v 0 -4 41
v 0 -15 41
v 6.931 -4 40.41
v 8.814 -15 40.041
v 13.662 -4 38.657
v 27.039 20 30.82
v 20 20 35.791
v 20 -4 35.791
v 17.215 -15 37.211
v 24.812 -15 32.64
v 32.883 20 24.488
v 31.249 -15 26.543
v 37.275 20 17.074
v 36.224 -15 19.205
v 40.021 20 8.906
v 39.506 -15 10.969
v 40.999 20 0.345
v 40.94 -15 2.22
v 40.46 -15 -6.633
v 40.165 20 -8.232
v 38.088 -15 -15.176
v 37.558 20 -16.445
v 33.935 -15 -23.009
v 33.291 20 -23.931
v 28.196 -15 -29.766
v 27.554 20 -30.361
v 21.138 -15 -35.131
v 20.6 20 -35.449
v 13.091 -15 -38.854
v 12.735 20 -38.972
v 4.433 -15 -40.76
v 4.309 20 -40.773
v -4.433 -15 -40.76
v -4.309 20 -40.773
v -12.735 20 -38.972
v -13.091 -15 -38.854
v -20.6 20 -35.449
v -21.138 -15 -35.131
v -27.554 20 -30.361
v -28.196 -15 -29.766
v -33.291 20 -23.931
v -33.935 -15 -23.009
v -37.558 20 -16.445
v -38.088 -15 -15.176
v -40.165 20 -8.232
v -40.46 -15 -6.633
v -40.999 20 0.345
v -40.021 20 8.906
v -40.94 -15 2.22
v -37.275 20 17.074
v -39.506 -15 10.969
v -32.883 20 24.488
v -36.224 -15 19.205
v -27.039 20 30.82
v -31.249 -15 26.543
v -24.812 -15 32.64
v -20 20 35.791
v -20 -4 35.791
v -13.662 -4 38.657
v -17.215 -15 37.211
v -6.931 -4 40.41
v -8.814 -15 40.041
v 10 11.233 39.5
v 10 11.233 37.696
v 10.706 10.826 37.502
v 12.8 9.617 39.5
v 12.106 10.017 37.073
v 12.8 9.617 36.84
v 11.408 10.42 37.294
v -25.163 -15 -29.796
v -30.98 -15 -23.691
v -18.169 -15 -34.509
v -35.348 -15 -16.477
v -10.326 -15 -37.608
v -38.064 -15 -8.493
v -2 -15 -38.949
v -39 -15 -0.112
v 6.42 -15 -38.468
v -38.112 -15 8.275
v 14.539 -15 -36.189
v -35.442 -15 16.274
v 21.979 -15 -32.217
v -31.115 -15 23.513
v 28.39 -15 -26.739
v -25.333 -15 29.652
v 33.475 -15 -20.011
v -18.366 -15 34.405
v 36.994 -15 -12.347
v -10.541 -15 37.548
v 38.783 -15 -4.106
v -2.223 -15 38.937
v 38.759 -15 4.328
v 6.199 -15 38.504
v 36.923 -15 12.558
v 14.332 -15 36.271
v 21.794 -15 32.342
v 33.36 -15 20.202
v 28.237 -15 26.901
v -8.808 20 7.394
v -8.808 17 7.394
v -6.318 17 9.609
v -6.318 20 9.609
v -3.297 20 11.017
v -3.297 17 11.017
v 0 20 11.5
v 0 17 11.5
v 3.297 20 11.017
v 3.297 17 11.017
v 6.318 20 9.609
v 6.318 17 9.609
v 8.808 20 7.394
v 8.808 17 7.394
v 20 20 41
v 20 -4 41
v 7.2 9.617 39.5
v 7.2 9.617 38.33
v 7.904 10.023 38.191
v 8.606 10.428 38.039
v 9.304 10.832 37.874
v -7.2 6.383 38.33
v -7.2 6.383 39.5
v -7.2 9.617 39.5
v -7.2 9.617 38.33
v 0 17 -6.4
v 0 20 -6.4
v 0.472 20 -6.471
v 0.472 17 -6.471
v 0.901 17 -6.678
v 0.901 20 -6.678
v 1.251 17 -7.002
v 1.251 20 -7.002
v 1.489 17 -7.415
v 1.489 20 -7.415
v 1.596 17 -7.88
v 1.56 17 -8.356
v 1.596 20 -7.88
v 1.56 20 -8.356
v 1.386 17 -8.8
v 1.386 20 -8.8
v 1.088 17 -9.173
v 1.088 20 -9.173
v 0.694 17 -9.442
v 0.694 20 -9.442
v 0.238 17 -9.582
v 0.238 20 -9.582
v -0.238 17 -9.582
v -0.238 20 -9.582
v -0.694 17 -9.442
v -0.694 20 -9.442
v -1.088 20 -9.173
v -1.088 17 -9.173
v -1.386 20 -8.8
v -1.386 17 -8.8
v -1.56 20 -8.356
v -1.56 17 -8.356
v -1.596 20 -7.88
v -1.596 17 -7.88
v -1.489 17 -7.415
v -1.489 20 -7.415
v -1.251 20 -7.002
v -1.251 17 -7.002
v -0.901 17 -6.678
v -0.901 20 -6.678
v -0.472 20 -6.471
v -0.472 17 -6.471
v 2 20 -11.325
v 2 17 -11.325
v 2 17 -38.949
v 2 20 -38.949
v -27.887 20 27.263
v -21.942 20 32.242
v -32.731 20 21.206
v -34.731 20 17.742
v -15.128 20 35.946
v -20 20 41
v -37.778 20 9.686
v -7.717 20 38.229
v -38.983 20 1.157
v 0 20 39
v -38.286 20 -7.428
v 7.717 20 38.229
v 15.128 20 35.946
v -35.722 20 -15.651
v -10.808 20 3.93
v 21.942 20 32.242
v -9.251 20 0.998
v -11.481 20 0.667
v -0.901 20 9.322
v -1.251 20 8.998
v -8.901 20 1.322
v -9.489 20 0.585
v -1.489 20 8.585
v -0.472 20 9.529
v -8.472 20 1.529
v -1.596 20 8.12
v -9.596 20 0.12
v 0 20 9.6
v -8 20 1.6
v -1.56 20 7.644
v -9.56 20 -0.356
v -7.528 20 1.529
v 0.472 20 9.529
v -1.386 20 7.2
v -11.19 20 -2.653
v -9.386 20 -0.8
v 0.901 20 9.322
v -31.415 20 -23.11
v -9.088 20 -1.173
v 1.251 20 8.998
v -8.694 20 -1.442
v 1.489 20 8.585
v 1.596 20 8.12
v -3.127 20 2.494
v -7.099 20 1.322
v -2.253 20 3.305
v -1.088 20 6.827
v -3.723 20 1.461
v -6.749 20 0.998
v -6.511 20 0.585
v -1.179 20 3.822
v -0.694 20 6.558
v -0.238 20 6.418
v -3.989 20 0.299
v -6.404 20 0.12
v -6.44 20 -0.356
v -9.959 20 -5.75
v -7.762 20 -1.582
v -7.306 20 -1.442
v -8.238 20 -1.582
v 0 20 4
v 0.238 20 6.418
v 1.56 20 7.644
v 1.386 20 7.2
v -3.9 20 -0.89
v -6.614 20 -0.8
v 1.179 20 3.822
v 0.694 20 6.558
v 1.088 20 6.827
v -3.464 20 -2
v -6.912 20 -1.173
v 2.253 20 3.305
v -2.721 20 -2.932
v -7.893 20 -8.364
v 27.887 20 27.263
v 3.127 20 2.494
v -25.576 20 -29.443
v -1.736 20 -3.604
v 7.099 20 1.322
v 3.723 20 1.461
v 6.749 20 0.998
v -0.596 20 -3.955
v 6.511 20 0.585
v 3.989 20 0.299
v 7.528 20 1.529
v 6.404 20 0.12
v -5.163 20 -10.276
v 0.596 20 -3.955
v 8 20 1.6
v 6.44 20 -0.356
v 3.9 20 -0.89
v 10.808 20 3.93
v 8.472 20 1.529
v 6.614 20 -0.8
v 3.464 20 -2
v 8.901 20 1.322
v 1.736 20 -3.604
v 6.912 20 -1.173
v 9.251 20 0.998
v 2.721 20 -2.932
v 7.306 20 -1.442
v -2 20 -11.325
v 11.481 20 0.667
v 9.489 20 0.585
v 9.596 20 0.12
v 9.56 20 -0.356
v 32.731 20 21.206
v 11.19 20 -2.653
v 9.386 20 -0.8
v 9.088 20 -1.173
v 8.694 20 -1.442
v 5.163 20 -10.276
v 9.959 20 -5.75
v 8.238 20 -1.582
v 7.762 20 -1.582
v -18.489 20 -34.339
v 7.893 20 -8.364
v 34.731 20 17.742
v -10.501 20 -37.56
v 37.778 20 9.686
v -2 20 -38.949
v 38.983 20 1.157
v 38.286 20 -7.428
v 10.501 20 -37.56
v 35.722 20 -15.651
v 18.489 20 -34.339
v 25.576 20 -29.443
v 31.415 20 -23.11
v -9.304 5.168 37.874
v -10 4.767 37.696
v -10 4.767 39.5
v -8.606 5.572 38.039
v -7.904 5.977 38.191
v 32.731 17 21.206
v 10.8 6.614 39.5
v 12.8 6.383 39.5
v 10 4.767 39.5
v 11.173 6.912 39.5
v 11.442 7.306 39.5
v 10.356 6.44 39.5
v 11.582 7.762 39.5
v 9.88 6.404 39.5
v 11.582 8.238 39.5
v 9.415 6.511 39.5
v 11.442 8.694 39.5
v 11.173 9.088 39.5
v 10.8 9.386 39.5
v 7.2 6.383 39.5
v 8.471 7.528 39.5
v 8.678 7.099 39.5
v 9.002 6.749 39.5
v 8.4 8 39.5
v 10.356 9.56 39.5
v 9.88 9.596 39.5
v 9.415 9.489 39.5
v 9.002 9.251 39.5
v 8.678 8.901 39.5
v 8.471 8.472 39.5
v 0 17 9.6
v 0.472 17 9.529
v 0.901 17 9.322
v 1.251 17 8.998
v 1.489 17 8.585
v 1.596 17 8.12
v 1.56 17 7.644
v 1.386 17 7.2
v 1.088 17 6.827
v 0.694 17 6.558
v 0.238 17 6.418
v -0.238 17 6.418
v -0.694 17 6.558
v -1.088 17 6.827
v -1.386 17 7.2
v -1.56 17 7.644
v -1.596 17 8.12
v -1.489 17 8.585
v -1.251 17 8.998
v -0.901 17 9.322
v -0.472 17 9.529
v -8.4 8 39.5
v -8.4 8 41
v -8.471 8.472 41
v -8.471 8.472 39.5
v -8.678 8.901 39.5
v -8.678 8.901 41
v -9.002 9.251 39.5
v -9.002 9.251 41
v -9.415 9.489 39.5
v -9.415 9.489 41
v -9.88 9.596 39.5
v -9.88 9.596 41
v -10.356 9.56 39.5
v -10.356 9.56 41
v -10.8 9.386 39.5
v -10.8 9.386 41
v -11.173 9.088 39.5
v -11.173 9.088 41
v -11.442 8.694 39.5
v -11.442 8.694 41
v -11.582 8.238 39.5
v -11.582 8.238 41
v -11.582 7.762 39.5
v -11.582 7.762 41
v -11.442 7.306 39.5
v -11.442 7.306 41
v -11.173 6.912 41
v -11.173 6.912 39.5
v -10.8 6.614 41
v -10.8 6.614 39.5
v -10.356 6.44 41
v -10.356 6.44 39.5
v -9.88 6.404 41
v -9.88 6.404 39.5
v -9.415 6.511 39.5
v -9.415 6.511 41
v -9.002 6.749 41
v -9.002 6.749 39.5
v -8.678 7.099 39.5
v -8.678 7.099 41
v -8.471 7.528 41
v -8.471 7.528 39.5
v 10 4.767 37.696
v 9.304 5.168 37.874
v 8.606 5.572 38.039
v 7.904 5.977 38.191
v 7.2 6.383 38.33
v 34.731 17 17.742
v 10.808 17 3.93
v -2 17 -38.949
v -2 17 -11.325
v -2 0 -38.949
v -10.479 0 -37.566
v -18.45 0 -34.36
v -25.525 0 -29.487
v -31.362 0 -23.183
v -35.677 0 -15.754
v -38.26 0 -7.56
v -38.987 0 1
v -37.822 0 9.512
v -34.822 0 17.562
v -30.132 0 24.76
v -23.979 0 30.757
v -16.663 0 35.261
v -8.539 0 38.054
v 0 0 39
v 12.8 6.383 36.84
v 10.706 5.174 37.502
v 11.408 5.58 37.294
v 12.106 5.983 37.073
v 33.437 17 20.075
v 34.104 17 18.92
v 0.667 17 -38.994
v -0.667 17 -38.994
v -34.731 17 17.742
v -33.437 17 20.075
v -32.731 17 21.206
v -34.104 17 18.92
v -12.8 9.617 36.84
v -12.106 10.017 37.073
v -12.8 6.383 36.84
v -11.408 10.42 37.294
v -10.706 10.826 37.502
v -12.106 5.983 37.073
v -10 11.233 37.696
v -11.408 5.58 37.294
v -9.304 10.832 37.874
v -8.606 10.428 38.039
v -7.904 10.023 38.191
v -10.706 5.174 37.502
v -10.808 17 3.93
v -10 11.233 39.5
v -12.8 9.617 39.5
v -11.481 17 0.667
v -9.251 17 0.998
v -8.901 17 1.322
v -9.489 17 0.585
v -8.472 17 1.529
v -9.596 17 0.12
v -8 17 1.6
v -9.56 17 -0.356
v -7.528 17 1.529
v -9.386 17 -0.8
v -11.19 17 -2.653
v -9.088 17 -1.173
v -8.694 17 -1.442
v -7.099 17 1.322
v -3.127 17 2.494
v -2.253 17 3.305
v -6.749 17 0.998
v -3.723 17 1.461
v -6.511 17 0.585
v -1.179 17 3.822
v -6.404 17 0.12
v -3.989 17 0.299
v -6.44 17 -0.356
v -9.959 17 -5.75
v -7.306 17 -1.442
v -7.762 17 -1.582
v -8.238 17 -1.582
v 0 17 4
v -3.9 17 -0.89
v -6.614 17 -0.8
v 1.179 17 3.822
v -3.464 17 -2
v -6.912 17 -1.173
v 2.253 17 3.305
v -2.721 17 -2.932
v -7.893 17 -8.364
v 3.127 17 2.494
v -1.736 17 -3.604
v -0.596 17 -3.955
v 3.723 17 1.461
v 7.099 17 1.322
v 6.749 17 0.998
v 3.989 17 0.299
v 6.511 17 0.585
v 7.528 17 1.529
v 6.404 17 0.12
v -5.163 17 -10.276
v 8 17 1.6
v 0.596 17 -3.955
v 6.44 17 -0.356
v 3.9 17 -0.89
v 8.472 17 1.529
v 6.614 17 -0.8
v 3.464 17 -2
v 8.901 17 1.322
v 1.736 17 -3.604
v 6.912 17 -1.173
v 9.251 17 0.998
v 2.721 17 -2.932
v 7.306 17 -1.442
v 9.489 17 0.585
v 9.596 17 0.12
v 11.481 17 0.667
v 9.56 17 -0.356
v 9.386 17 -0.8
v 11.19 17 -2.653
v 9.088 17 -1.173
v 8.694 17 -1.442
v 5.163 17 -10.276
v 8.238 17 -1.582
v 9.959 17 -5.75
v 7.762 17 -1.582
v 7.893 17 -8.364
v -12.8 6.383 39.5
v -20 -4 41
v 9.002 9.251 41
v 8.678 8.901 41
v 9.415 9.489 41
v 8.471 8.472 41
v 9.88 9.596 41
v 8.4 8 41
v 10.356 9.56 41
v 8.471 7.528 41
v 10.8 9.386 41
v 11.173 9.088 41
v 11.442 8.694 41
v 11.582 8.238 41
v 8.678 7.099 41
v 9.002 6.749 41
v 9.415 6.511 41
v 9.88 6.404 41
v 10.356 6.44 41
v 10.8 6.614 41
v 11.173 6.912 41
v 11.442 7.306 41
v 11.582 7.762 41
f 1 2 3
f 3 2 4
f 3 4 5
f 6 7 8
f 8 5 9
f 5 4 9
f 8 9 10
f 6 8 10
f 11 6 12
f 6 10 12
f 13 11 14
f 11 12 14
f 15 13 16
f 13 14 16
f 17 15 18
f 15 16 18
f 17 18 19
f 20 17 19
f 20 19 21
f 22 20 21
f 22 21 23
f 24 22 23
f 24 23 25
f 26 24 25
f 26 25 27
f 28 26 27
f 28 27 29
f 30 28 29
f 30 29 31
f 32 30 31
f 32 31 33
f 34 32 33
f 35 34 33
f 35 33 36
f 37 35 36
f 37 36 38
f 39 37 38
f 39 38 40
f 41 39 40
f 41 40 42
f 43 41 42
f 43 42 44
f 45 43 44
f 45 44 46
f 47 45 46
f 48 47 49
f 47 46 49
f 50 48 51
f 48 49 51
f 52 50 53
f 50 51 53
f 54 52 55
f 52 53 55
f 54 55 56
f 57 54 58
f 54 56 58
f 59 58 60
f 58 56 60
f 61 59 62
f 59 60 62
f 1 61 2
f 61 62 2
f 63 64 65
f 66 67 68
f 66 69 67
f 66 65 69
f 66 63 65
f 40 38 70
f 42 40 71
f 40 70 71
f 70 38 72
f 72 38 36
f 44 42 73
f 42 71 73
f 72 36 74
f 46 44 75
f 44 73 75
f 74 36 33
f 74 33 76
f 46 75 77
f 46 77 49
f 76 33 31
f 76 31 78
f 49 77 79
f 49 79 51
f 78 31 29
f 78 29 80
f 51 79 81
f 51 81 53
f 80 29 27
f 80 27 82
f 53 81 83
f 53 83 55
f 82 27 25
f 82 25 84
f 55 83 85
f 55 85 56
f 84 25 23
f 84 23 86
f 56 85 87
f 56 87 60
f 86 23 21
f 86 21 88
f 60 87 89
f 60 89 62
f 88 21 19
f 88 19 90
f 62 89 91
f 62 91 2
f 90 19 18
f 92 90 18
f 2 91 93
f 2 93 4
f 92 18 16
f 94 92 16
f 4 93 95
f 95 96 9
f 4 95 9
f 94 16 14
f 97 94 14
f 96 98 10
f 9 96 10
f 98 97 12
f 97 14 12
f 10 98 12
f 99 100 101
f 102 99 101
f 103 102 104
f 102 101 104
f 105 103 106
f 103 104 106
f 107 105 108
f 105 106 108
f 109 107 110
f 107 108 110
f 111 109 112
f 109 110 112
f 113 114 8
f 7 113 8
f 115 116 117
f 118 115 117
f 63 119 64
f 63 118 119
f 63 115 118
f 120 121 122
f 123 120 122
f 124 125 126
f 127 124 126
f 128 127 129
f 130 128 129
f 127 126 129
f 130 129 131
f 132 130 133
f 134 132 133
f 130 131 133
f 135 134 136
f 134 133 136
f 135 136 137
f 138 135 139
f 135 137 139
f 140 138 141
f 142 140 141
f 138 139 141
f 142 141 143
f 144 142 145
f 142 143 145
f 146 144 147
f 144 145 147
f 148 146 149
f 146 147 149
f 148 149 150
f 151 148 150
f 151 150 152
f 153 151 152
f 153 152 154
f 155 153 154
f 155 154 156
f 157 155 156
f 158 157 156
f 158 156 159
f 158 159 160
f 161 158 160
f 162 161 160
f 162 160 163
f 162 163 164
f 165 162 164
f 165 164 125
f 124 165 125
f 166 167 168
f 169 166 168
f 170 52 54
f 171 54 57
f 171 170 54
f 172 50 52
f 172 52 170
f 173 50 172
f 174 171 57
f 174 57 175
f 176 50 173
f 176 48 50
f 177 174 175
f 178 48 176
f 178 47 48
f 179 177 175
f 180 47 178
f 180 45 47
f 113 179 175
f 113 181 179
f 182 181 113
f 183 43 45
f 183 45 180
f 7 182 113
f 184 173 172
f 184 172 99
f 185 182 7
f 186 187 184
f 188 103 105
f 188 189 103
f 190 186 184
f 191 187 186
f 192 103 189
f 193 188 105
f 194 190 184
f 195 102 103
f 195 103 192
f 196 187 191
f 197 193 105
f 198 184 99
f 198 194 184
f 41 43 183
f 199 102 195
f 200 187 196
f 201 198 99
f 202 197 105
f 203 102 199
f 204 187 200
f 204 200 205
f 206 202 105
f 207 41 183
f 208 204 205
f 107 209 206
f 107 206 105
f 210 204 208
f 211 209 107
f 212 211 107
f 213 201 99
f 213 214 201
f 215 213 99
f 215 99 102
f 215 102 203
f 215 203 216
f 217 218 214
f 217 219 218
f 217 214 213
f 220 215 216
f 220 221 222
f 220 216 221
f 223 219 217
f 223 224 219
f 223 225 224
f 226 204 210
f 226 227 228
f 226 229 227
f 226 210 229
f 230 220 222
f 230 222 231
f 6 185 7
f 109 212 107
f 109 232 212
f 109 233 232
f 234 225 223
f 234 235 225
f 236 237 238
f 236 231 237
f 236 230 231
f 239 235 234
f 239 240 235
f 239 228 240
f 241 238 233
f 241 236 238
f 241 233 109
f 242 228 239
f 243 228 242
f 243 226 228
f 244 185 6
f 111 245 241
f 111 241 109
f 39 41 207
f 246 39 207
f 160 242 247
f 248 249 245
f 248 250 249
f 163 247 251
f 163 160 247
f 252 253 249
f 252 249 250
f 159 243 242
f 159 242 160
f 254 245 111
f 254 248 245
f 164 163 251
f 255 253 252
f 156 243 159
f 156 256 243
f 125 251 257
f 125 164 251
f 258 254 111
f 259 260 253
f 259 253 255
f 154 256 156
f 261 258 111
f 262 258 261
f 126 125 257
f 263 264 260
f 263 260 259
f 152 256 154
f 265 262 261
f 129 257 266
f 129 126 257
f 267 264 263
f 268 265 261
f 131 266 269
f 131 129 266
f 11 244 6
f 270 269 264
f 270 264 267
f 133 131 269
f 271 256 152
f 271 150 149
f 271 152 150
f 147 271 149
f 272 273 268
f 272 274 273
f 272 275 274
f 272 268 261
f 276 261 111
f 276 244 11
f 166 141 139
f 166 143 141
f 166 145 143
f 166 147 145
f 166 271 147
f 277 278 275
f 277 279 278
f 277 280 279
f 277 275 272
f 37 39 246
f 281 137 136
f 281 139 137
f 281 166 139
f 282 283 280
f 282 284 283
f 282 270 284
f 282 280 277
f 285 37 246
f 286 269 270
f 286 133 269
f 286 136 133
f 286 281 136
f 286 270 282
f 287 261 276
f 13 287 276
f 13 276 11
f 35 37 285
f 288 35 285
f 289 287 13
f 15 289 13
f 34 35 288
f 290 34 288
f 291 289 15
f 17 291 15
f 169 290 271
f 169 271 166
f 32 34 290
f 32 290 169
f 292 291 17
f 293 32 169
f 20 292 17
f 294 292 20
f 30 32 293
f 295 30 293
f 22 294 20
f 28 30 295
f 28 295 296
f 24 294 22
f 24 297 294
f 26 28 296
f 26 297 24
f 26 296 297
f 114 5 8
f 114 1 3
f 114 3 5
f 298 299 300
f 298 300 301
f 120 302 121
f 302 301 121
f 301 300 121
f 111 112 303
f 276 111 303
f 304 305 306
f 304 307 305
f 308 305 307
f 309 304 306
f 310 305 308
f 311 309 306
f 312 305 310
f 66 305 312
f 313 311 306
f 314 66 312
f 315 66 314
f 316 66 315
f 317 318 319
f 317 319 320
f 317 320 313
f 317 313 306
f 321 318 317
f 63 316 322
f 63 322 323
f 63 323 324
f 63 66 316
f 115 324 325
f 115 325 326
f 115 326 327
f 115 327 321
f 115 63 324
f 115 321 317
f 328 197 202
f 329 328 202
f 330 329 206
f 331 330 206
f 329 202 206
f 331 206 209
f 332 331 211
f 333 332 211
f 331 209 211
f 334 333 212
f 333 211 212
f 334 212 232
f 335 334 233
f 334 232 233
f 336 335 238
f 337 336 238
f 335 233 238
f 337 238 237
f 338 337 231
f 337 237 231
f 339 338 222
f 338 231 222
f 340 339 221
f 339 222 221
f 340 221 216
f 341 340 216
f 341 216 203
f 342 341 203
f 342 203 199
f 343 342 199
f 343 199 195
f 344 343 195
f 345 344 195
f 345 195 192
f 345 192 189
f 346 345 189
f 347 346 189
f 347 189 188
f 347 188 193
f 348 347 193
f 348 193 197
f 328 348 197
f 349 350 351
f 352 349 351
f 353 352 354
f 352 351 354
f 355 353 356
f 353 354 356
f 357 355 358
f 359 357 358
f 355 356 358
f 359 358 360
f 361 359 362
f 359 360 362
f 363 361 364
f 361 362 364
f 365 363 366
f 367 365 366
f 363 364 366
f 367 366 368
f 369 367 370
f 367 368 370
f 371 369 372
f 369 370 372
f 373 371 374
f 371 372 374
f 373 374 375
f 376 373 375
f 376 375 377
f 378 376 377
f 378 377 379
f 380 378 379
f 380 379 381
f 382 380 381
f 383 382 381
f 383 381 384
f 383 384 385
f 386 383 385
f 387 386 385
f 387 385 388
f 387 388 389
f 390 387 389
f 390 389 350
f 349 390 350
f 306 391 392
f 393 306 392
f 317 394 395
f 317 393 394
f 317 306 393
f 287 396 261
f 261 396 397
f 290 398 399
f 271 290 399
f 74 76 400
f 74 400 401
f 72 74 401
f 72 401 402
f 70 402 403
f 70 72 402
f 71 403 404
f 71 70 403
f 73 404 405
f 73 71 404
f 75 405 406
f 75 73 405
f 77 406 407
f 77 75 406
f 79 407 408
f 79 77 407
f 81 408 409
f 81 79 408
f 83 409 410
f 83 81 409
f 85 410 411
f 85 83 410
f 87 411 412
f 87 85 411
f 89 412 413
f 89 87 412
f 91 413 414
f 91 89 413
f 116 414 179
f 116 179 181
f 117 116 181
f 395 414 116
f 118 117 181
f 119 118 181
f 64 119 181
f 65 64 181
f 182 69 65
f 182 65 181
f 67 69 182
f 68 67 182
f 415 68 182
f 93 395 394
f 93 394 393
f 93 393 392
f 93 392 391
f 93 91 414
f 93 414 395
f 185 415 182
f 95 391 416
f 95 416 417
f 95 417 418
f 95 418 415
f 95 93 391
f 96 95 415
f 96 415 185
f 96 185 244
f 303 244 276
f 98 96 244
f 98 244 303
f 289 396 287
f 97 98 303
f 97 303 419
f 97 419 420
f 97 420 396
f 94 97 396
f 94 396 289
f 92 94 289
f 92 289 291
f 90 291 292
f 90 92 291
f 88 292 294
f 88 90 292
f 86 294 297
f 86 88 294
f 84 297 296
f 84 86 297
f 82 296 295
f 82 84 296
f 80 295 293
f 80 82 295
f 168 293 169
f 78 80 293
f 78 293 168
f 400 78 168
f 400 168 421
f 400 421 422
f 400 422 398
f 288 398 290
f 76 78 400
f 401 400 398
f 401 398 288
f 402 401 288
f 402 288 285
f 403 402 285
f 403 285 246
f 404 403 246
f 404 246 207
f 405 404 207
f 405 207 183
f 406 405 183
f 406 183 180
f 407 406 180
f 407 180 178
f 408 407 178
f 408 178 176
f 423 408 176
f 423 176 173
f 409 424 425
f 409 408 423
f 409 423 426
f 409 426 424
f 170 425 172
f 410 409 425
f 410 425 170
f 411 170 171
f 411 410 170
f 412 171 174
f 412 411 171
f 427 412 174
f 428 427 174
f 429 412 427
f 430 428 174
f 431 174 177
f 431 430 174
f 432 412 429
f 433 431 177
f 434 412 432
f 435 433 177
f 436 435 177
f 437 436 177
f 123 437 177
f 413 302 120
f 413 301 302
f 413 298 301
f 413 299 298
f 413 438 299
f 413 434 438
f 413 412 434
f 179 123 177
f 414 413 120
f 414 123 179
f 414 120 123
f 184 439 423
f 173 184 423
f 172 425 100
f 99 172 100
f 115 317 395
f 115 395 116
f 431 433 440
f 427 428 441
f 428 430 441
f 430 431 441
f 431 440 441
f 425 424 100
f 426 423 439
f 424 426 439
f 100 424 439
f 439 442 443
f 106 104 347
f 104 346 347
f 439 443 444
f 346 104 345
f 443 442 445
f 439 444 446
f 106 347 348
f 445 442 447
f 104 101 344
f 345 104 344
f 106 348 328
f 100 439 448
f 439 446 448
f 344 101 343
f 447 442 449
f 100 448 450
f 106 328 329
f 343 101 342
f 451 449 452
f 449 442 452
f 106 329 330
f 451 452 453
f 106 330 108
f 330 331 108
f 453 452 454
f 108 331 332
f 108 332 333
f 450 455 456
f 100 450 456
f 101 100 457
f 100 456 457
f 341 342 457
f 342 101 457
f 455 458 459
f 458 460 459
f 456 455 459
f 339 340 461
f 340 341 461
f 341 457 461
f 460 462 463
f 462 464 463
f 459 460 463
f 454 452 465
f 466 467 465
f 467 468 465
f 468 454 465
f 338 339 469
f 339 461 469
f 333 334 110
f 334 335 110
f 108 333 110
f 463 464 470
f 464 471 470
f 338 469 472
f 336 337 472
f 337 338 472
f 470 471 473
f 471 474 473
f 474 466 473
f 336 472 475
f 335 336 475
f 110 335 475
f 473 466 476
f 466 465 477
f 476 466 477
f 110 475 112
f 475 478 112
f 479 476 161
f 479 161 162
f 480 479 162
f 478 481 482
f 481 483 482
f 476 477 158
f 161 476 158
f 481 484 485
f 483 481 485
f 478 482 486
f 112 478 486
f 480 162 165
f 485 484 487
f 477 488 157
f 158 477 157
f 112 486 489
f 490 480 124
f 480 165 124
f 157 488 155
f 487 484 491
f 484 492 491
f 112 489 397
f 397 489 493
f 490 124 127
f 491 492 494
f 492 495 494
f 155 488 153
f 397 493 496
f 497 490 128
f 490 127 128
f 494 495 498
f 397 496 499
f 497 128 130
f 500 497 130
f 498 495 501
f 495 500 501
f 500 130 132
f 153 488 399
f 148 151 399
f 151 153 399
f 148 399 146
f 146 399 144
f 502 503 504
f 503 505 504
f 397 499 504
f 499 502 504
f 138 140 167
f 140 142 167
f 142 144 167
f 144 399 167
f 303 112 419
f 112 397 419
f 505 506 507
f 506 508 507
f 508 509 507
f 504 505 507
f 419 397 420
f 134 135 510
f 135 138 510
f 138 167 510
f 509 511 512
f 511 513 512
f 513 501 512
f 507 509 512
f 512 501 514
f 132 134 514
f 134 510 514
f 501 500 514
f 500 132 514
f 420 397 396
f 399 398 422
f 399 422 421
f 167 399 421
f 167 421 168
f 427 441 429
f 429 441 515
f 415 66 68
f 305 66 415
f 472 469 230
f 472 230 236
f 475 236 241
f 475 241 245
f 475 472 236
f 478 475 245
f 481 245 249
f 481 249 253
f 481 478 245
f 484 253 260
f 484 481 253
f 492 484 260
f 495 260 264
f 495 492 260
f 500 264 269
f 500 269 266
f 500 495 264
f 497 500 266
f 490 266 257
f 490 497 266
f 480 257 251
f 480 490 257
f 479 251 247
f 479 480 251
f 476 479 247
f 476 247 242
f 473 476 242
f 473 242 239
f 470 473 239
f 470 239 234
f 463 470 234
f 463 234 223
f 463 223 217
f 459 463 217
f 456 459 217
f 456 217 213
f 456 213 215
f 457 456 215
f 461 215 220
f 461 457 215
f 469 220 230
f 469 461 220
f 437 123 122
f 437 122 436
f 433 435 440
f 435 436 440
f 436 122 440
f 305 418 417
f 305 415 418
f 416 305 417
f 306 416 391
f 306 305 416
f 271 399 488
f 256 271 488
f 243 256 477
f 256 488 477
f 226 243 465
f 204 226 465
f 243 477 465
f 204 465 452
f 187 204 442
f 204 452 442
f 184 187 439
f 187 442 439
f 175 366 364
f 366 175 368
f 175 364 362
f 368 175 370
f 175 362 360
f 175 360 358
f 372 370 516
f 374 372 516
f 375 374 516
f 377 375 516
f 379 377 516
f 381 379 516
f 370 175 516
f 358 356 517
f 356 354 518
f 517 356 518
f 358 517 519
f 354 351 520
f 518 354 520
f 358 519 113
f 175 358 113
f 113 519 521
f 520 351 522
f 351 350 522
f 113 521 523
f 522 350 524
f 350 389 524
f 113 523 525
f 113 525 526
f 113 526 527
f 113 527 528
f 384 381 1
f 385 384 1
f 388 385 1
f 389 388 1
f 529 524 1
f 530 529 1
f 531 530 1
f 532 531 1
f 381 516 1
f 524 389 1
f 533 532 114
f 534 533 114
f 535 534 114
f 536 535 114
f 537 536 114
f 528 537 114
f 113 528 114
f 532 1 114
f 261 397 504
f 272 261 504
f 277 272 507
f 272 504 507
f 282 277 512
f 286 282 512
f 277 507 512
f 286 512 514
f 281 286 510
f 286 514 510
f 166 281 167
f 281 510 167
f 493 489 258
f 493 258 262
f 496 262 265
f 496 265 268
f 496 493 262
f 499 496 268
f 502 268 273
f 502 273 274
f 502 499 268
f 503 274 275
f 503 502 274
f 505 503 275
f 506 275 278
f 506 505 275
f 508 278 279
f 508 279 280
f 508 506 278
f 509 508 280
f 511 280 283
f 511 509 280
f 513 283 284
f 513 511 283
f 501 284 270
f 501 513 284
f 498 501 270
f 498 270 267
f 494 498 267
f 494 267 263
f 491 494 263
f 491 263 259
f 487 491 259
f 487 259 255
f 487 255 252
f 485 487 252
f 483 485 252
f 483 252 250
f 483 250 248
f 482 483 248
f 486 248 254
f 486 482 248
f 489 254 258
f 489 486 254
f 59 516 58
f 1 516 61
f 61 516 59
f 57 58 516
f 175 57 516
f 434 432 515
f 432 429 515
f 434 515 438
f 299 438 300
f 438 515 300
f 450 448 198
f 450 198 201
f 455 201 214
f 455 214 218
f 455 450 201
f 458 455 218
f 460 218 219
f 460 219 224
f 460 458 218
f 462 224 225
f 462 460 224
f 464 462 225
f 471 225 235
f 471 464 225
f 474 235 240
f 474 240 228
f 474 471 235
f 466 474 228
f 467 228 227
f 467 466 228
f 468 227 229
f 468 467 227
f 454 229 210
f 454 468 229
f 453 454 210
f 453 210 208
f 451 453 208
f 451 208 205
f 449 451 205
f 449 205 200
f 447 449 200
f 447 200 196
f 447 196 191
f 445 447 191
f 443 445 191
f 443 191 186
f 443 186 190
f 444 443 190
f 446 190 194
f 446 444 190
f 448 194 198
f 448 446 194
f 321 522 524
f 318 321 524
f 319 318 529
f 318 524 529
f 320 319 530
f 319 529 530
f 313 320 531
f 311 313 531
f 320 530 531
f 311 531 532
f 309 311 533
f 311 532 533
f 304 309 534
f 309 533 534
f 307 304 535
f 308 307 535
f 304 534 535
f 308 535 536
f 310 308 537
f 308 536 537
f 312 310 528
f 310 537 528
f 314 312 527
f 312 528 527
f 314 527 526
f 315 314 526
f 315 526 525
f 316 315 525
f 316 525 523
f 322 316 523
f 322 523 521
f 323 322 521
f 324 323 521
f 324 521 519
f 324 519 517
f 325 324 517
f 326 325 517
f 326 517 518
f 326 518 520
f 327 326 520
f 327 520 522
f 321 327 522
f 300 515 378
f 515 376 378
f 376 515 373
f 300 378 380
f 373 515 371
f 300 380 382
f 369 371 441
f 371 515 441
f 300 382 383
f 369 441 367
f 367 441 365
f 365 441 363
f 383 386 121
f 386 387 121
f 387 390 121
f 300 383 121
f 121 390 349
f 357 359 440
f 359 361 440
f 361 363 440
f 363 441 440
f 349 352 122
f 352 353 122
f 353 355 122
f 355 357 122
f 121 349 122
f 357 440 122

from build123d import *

# Parameters (mm, degrees)
SKETCH_1_R           = 41
SKETCH_1_R_2         = 39
EXTRUDE_1_DEPTH      = 20
EXTRUDE_START        = -14
EXTRUDE_2_DEPTH      = 14
EXTRUDE_START_2      = -3
SKETCH_3_R           = 4
SKETCH_3_R_2         = 1.6
EXTRUDE_3_DEPTH      = 3
CUT_EXTRUDE_3_DEPTH  = 3
EXTRUDE_5_DEPTH      = 10
EXTRUDE_5_DEPTH_BACK = 15
SKETCH_1_2_R         = 41
SKETCH_1_2_R_2       = 39
EXTRUDE_START_3      = 10
EXTRUDE_7_DEPTH      = 10
EXTRUDE_8_DEPTH      = 10
EXTRUDE_8_DEPTH_BACK = 5
CUT_EXTRUDE_4_DEPTH  = 10
EXTRUDE_9_DEPTH      = 10
EXTRUDE_9_DEPTH_BACK = 1.5
CUT_EXTRUDE_6_DEPTH  = 10
SKETCH_16_R          = 1.6
CUT_EXTRUDE_7_DEPTH  = 3
SKETCH_18_R          = 1.6
CUT_EXTRUDE_8_DEPTH  = 10
SKETCH_18_4_R        = 1.6
CUT_EXTRUDE_9_DEPTH  = 10


with BuildPart() as part:
    # 草图1 → 凸台-拉伸1 (new body)
    with BuildSketch(Plane(origin=(0, 0, 0), x_dir=(1, 0, 0), z_dir=(0, 1, 0))):
        Circle(SKETCH_1_R)
        Circle(SKETCH_1_R_2, mode=Mode.SUBTRACT)
    extrude(amount=EXTRUDE_1_DEPTH)

    # 草图2 → 凸台-拉伸2 (add)
    with BuildSketch(Plane(origin=(0, 20, 0), x_dir=(1, 0, 0), z_dir=(0, 1, 0)).offset(EXTRUDE_START)):
        with BuildLine():
            Line((3.5e-08, -41), (20, -41))
            Line((20, -41), (20, -35.791060336))
            ThreePointArc((20, -35.791060336), (10.333598766, -39.676400247), (3.5e-08, -41))
        make_face()
        with BuildLine():
            Line((-20, -41), (3.5e-08, -41))
            ThreePointArc((3.5e-08, -41), (-10.333598732, -39.676400256), (-20, -35.791060336))
            Line((-20, -35.791060336), (-20, -41))
        make_face()
    extrude(amount=EXTRUDE_2_DEPTH)

    # 草图3 → 凸台-拉伸3 (add)
    with BuildSketch(Plane(origin=(0, 20, 0), x_dir=(1, 0, 0), z_dir=(0, 1, 0)).offset(EXTRUDE_START_2)):
        with BuildLine():
            Line((-2, 38.948684188), (-2, 11.324751653))
            ThreePointArc((-2, 11.324751653), (-9.959292144, 5.75), (-10.807522623, -3.930325019))
            Line((-10.807522623, -3.930325019), (-34.730549951, -17.742291287))
            ThreePointArc((-34.730549951, -17.742291287), (-33.774990748, -19.5), (-32.730549951, -21.206392902))
            Line((-32.730549951, -21.206392902), (-8.807522623, -7.394426634))
            ThreePointArc((-8.807522623, -7.394426634), (0, -11.5), (8.807522623, -7.394426634))
            Line((8.807522623, -7.394426634), (32.730549951, -21.206392902))
            ThreePointArc((32.730549951, -21.206392902), (33.774990748, -19.5), (34.730549951, -17.742291287))
            Line((34.730549951, -17.742291287), (10.807522623, -3.930325019))
            ThreePointArc((10.807522623, -3.930325019), (9.959292144, 5.75), (2, 11.324751653))
            Line((2, 11.324751653), (2, 38.948684188))
            ThreePointArc((2, 38.948684188), (0, 39), (-2, 38.948684188))
        make_face()
        Circle(SKETCH_3_R, mode=Mode.SUBTRACT)
        with Locations((-8, 0)):
            Circle(SKETCH_3_R_2, mode=Mode.SUBTRACT)
        with Locations((8, 0)):
            Circle(SKETCH_3_R_2, mode=Mode.SUBTRACT)
    extrude(amount=EXTRUDE_3_DEPTH)

    # 草图7 → 切除-拉伸3 (cut)
    with BuildSketch(Plane.XZ.offset(-6)):
        with BuildLine():
            Line((0, 41), (-20, 41))
            Line((-20, 41), (-20, 35.791060336))
            ThreePointArc((-20, 35.791060336), (-10.333598749, 39.676400251), (0, 41))
        make_face()
        with BuildLine():
            Line((20, 41), (0, 41))
            ThreePointArc((0, 41), (10.333598749, 39.676400251), (20, 35.791060336))
            Line((20, 35.791060336), (20, 41))
        make_face()
    extrude(amount=-CUT_EXTRUDE_3_DEPTH, mode=Mode.SUBTRACT)

    # 草图1<2> → 凸台-拉伸5 (add, two sides: drawn at the far end of the back side and taken through both)
    with BuildSketch(Plane(origin=(0, 0, 0), x_dir=(1, 0, 0), z_dir=(0, 1, 0)).offset(-EXTRUDE_5_DEPTH_BACK)):
        Circle(SKETCH_1_2_R)
        Circle(SKETCH_1_2_R_2, mode=Mode.SUBTRACT)
    extrude(amount=EXTRUDE_5_DEPTH + EXTRUDE_5_DEPTH_BACK)

    # 草图7<4> → 凸台-拉伸7 (add)
    with BuildSketch(Plane.XZ.offset(-6).offset(EXTRUDE_START_3)):
        with BuildLine():
            Line((0, 41), (-20, 41))
            Line((-20, 41), (-20, 35.791060336))
            ThreePointArc((-20, 35.791060336), (-10.333598749, 39.676400251), (0, 41))
        make_face()
        with BuildLine():
            Line((20, 41), (0, 41))
            ThreePointArc((0, 41), (10.333598749, 39.676400251), (20, 35.791060336))
            Line((20, 35.791060336), (20, 41))
        make_face()
    extrude(amount=-EXTRUDE_7_DEPTH)

    # 草图7<5> → 凸台-拉伸8 (add, two sides: drawn at the far end of the back side and taken through both)
    with BuildSketch(Plane.XZ.offset(-6).offset(-EXTRUDE_8_DEPTH_BACK)):
        with BuildLine():
            Line((0, 41), (-20, 41))
            Line((-20, 41), (-20, 35.791060336))
            ThreePointArc((-20, 35.791060336), (-10.333598749, 39.676400251), (0, 41))
        make_face()
        with BuildLine():
            Line((20, 41), (0, 41))
            ThreePointArc((0, 41), (10.333598749, 39.676400251), (20, 35.791060336))
            Line((20, 35.791060336), (20, 41))
        make_face()
    extrude(amount=EXTRUDE_8_DEPTH + EXTRUDE_8_DEPTH_BACK)

    # 草图4 → 切除-拉伸4 (cut)
    with BuildSketch(Plane.XY.offset(41)):
        Polygon((-10, 4.766838493), (-7.2, 6.383419246), (-7.2, 9.616580754), (-10, 11.233161507), (-12.8, 9.616580754), (-12.8, 6.383419246), align=None)
        Polygon((12.8, 6.383419246), (10, 4.766838493), (7.2, 6.383419246), (7.2, 9.616580754), (10, 11.233161507), (12.8, 9.616580754), align=None)
    extrude(amount=-CUT_EXTRUDE_4_DEPTH, mode=Mode.SUBTRACT)

    # 草图4<3> → 凸台-拉伸9 (add, two sides: drawn at the far end of the back side and taken through both)
    with BuildSketch(Plane.XY.offset(41).offset(-EXTRUDE_9_DEPTH_BACK)):
        Polygon((-10, 4.766838493), (-7.2, 6.383419246), (-7.2, 9.616580754), (-10, 11.233161507), (-12.8, 9.616580754), (-12.8, 6.383419246), align=None)
        Polygon((12.8, 6.383419246), (10, 4.766838493), (7.2, 6.383419246), (7.2, 9.616580754), (10, 11.233161507), (12.8, 9.616580754), align=None)
    extrude(amount=EXTRUDE_9_DEPTH + EXTRUDE_9_DEPTH_BACK)

    # 草图13 → 切除-拉伸6 (cut)
    with BuildSketch(Plane.XY.offset(51)):
        Polygon((10, 11.233161507), (7.2, 9.616580754), (7.2, 6.383419246), (10, 4.766838493), (12.8, 6.383419246), (12.8, 9.616580754), align=None)
        Polygon((-10, 11.233161507), (-12.8, 9.616580754), (-12.8, 6.383419246), (-10, 4.766838493), (-7.2, 6.383419246), (-7.2, 9.616580754), align=None)
    extrude(amount=-CUT_EXTRUDE_6_DEPTH, mode=Mode.SUBTRACT)

    # 草图16 → 切除-拉伸7 (cut)
    with BuildSketch(Plane.XY.offset(41)):
        with Locations((-10, 8)):
            Circle(SKETCH_16_R)
        with Locations((10, 8)):
            Circle(SKETCH_16_R)
    extrude(amount=-CUT_EXTRUDE_7_DEPTH, mode=Mode.SUBTRACT)

    # 草图18 → 切除-拉伸8 (cut)
    with BuildSketch(Plane(origin=(0, 20, 0), x_dir=(1, 0, 0), z_dir=(0, 1, 0))):
        with Locations((0, 8)):
            Circle(SKETCH_18_R)
    extrude(amount=-CUT_EXTRUDE_8_DEPTH, mode=Mode.SUBTRACT)

    # 草图18<4> → 切除-拉伸9 (cut)
    with BuildSketch(Plane(origin=(0, 20, 0), x_dir=(1, 0, 0), z_dir=(0, 1, 0))):
        with Locations((0, 8)):
            Circle(SKETCH_18_4_R)
        with Locations((0, -8)):
            Circle(SKETCH_18_4_R)
    extrude(amount=-CUT_EXTRUDE_9_DEPTH, mode=Mode.SUBTRACT)


solid = part.part
